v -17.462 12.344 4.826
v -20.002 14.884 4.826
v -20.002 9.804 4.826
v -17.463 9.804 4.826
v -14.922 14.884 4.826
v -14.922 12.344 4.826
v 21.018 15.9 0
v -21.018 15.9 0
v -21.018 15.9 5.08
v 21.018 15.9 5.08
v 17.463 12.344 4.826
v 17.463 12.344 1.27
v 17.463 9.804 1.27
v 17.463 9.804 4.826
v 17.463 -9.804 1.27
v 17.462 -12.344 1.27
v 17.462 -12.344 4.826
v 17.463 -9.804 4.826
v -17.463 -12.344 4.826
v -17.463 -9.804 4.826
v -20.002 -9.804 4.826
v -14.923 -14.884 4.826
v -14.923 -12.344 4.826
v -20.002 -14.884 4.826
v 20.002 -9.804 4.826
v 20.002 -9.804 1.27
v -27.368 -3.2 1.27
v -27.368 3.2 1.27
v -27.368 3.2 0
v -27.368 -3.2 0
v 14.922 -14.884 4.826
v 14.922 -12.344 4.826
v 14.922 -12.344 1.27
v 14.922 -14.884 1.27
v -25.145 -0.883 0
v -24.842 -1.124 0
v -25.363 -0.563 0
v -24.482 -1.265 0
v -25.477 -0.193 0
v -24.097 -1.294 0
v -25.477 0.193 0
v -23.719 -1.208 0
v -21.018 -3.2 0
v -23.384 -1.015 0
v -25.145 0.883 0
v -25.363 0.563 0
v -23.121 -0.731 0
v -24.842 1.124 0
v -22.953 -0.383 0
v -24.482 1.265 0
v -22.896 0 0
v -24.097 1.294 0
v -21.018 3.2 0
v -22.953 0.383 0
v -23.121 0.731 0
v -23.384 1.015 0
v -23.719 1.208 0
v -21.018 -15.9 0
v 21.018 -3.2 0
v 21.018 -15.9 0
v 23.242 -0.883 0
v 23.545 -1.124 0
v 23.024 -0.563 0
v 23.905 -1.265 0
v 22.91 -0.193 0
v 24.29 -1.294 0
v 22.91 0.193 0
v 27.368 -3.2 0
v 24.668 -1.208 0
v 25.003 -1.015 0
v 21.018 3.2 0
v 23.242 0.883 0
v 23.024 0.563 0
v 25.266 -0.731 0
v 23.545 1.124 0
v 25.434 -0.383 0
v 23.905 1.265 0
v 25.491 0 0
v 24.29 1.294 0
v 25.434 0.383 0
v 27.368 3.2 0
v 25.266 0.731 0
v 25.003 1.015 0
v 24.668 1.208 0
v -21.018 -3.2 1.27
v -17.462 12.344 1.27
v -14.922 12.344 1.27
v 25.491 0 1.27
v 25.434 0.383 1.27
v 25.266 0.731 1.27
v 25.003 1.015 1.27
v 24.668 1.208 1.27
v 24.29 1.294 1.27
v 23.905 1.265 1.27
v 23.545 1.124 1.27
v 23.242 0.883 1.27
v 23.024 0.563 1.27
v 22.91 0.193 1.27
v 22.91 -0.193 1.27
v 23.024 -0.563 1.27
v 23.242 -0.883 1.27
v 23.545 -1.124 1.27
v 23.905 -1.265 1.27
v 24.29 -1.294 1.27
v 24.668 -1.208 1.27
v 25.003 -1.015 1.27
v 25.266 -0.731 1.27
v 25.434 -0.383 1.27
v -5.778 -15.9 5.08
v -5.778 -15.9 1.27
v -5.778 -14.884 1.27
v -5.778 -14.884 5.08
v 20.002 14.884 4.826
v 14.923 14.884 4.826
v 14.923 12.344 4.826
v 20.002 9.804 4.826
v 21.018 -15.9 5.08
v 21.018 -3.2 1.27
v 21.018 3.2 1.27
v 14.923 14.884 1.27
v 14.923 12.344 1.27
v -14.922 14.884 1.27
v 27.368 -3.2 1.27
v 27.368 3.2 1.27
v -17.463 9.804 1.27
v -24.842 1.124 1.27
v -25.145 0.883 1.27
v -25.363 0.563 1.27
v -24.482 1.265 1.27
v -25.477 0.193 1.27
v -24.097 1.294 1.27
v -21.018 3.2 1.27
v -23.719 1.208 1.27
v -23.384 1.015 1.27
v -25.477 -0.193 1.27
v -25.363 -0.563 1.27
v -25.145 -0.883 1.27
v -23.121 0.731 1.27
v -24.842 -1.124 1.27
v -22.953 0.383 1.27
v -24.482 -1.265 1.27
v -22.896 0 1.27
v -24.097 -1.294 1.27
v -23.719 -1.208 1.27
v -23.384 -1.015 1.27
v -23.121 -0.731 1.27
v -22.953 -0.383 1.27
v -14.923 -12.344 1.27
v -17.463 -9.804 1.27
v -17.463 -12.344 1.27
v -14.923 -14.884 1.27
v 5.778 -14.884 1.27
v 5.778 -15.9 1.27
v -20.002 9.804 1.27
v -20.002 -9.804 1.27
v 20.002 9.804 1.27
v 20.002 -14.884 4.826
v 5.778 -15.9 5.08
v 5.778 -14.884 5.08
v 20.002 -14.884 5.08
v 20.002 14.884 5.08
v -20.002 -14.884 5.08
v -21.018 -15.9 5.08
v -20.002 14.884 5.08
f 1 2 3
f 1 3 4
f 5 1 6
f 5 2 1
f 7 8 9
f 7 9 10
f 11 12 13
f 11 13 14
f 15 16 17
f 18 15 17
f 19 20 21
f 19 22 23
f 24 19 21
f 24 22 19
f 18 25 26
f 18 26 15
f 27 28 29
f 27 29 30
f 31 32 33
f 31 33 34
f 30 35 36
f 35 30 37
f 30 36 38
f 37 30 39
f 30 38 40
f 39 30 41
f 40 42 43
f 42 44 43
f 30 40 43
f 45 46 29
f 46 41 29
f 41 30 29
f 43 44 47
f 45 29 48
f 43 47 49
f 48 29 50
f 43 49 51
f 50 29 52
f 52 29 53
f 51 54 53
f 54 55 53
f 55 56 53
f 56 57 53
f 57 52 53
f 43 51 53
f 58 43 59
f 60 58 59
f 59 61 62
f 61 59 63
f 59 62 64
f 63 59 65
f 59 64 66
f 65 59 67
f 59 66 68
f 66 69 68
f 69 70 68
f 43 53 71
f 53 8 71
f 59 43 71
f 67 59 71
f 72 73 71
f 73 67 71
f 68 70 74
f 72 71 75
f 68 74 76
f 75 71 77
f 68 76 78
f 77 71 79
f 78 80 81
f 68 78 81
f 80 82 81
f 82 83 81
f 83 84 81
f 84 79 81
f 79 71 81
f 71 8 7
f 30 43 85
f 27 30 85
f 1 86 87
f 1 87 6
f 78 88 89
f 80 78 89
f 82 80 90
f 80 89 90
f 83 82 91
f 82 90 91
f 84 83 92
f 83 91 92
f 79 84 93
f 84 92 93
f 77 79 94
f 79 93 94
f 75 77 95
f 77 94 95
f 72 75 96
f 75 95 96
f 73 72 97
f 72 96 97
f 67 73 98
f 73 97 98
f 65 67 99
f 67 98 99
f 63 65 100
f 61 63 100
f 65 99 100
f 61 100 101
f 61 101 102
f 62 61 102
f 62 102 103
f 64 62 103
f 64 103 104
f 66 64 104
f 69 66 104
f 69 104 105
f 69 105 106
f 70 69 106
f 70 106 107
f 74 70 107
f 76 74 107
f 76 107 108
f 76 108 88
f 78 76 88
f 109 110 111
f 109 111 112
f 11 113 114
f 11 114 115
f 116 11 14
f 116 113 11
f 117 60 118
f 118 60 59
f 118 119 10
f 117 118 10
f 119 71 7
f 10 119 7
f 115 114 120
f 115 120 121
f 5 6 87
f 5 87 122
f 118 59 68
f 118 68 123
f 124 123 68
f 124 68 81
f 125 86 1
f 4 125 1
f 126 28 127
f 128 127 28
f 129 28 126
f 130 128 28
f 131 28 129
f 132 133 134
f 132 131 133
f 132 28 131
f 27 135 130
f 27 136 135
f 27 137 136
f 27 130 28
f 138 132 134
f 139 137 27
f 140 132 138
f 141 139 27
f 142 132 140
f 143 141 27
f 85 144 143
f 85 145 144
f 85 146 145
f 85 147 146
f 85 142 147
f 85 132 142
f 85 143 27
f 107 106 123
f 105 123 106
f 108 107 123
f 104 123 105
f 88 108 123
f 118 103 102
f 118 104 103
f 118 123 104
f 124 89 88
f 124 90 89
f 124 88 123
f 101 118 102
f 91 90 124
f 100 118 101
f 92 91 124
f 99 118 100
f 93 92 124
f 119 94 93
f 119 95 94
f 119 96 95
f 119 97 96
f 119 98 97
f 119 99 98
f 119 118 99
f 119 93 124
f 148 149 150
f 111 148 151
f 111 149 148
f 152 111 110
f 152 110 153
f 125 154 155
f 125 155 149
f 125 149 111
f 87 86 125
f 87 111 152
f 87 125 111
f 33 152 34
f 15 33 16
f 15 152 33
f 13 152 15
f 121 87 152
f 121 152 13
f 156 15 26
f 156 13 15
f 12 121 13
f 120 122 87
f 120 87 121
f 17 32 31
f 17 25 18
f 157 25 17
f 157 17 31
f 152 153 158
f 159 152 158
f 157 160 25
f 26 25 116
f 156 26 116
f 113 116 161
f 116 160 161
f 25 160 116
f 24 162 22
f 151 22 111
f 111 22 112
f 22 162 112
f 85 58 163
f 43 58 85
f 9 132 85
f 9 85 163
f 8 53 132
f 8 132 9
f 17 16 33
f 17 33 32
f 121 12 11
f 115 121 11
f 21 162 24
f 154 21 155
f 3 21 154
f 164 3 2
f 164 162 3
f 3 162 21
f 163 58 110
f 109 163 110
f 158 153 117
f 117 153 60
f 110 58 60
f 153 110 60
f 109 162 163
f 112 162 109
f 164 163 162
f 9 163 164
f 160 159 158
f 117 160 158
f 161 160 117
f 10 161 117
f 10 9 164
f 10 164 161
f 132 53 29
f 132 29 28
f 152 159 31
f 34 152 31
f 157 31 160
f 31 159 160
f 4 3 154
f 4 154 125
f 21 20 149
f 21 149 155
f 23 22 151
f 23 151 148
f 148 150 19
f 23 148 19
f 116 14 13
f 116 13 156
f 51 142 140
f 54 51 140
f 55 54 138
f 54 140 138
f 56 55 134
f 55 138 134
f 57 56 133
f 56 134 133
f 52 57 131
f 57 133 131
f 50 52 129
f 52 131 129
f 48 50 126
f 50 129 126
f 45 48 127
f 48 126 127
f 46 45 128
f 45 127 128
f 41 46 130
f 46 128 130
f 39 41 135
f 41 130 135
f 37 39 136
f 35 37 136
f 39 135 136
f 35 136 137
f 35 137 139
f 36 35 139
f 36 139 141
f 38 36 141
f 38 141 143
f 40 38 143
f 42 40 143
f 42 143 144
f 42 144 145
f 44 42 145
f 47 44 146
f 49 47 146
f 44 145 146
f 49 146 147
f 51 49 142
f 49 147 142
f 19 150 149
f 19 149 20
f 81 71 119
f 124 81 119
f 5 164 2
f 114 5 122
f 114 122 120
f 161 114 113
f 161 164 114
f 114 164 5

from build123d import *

# Parameters (mm, degrees)
F0_W      = 42.037
F0_H      = 31.8008
F1_DEPTH  = 5.08
F2_W      = 40.005
F2_H      = 29.7688
F3_DEPTH  = 3.81
F4_W      = 2.54
F4_H      = 3.556
F5_DEPTH  = 5.08
F6_W      = 2.54
F6_H      = 3.556
F7_DEPTH  = 2.54
F8_W      = 2.54
F8_H      = 3.556
F9_DEPTH  = 5.08
F10_W     = 2.54
F10_H     = 3.556
F11_DEPTH = 2.54
F12_W     = 2.54
F12_H     = 3.556
F13_DEPTH = 5.08
F14_W     = 2.54
F14_H     = 3.556
F15_DEPTH = 2.54
F16_W     = 2.54
F16_H     = 3.556
F17_DEPTH = 5.08
F18_W     = 2.54
F18_H     = 3.556
F19_DEPTH = 2.54
F20_W     = 11.557
F20_H     = 3.81
F21_DEPTH = 1.016
F22_W     = 6.4008
F22_H     = 1.27
F23_DEPTH = 6.35
F24_W     = 6.4008
F24_H     = 1.27
F25_DEPTH = 6.35
F26_R     = 1.29794
F27_DEPTH = 1.271
F28_R     = 1.29794
F29_DEPTH = 1.27


with BuildPart() as f1:
    # F0 (on Top) → F1 (new body)
    with BuildSketch(Plane.XY):
        Rectangle(F0_W, F0_H)
    extrude(amount=F1_DEPTH)

    # F2 (on face) → F3 (cut)
    with BuildSketch(Plane.XY.offset(5.08)):
        Rectangle(F2_W, F2_H)
    extrude(amount=-F3_DEPTH, mode=Mode.SUBTRACT)

    # F4 (on face) → F5 (join)
    with BuildSketch(Plane(origin=(0, -14.8844, 0), x_dir=(-1, 0, 0), z_dir=(0, 1, 0))):
        with Locations((-18.7325, 3.048)):
            Rectangle(F4_W, F4_H)
    extrude(amount=F5_DEPTH)

    # F6 (on face) → F7 (join)
    with BuildSketch(Plane.YZ.offset(-17.4625)):
        with Locations((13.6144, 3.048)):
            Rectangle(F6_W, F6_H)
    extrude(amount=F7_DEPTH)

    # F8 (on face) → F9 (join)
    with BuildSketch(Plane.YZ.offset(-20.0025)):
        with Locations((-13.6144, 3.048)):
            Rectangle(F8_W, F8_H)
    extrude(amount=F9_DEPTH)

    # F10 (on face) → F11 (join)
    with BuildSketch(Plane.XZ.offset(-12.3444)):
        with Locations((18.7325, 3.048)):
            Rectangle(F10_W, F10_H)
    extrude(amount=F11_DEPTH)

    # F12 (on face) → F13 (join)
    with BuildSketch(Plane.XZ.offset(-14.8844)):
        with Locations((-18.7325, 3.048)):
            Rectangle(F12_W, F12_H)
    extrude(amount=F13_DEPTH)

    # F14 (on face) → F15 (join)
    with BuildSketch(Plane(origin=(17.4625, 0, 0), x_dir=(0, -1, 0), z_dir=(-1, 0, 0))):
        with Locations((13.6144, 3.048)):
            Rectangle(F14_W, F14_H)
    extrude(amount=F15_DEPTH)

    # F16 (on face) → F17 (join)
    with BuildSketch(Plane(origin=(20.0025, 0, 0), x_dir=(0, -1, 0), z_dir=(-1, 0, 0))):
        with Locations((-13.6144, 3.048)):
            Rectangle(F16_W, F16_H)
    extrude(amount=F17_DEPTH)

    # F18 (on face) → F19 (join)
    with BuildSketch(Plane(origin=(0, -12.3444, 0), x_dir=(-1, 0, 0), z_dir=(0, 1, 0))):
        with Locations((18.7325, 3.048)):
            Rectangle(F18_W, F18_H)
    extrude(amount=F19_DEPTH)

    # F20 (on face) → F21 (cut, through all)
    with BuildSketch(Plane.XZ.offset(15.9004)):
        with Locations((0, 3.175)):
            Rectangle(F20_W, F20_H)
    extrude(amount=-F21_DEPTH, mode=Mode.SUBTRACT)

    # F22 (on face) → F23 (join)
    with BuildSketch(Plane.YZ.offset(21.0185)):
        with Locations((0, 0.635)):
            Rectangle(F22_W, F22_H)
    extrude(amount=F23_DEPTH)

    # F24 (on face) → F25 (join)
    with BuildSketch(Plane(origin=(-21.0185, 0, 0), x_dir=(0, -1, 0), z_dir=(-1, 0, 0))):
        with Locations((0, 0.635)):
            Rectangle(F24_W, F24_H)
    extrude(amount=F25_DEPTH)

    # F26 (on face) → F27 (cut, through all)
    with BuildSketch(Plane.XY.offset(1.27)):
        with Locations((24.1935, 0)):
            Circle(F26_R)
    extrude(amount=-F27_DEPTH, mode=Mode.SUBTRACT)

    # F28 (on face) → F29 (cut, through all)
    with BuildSketch(Plane.XY.offset(1.27)):
        with Locations((-24.1935, 0)):
            Circle(F28_R)
    extrude(amount=-F29_DEPTH, mode=Mode.SUBTRACT)


solid = f1.part
